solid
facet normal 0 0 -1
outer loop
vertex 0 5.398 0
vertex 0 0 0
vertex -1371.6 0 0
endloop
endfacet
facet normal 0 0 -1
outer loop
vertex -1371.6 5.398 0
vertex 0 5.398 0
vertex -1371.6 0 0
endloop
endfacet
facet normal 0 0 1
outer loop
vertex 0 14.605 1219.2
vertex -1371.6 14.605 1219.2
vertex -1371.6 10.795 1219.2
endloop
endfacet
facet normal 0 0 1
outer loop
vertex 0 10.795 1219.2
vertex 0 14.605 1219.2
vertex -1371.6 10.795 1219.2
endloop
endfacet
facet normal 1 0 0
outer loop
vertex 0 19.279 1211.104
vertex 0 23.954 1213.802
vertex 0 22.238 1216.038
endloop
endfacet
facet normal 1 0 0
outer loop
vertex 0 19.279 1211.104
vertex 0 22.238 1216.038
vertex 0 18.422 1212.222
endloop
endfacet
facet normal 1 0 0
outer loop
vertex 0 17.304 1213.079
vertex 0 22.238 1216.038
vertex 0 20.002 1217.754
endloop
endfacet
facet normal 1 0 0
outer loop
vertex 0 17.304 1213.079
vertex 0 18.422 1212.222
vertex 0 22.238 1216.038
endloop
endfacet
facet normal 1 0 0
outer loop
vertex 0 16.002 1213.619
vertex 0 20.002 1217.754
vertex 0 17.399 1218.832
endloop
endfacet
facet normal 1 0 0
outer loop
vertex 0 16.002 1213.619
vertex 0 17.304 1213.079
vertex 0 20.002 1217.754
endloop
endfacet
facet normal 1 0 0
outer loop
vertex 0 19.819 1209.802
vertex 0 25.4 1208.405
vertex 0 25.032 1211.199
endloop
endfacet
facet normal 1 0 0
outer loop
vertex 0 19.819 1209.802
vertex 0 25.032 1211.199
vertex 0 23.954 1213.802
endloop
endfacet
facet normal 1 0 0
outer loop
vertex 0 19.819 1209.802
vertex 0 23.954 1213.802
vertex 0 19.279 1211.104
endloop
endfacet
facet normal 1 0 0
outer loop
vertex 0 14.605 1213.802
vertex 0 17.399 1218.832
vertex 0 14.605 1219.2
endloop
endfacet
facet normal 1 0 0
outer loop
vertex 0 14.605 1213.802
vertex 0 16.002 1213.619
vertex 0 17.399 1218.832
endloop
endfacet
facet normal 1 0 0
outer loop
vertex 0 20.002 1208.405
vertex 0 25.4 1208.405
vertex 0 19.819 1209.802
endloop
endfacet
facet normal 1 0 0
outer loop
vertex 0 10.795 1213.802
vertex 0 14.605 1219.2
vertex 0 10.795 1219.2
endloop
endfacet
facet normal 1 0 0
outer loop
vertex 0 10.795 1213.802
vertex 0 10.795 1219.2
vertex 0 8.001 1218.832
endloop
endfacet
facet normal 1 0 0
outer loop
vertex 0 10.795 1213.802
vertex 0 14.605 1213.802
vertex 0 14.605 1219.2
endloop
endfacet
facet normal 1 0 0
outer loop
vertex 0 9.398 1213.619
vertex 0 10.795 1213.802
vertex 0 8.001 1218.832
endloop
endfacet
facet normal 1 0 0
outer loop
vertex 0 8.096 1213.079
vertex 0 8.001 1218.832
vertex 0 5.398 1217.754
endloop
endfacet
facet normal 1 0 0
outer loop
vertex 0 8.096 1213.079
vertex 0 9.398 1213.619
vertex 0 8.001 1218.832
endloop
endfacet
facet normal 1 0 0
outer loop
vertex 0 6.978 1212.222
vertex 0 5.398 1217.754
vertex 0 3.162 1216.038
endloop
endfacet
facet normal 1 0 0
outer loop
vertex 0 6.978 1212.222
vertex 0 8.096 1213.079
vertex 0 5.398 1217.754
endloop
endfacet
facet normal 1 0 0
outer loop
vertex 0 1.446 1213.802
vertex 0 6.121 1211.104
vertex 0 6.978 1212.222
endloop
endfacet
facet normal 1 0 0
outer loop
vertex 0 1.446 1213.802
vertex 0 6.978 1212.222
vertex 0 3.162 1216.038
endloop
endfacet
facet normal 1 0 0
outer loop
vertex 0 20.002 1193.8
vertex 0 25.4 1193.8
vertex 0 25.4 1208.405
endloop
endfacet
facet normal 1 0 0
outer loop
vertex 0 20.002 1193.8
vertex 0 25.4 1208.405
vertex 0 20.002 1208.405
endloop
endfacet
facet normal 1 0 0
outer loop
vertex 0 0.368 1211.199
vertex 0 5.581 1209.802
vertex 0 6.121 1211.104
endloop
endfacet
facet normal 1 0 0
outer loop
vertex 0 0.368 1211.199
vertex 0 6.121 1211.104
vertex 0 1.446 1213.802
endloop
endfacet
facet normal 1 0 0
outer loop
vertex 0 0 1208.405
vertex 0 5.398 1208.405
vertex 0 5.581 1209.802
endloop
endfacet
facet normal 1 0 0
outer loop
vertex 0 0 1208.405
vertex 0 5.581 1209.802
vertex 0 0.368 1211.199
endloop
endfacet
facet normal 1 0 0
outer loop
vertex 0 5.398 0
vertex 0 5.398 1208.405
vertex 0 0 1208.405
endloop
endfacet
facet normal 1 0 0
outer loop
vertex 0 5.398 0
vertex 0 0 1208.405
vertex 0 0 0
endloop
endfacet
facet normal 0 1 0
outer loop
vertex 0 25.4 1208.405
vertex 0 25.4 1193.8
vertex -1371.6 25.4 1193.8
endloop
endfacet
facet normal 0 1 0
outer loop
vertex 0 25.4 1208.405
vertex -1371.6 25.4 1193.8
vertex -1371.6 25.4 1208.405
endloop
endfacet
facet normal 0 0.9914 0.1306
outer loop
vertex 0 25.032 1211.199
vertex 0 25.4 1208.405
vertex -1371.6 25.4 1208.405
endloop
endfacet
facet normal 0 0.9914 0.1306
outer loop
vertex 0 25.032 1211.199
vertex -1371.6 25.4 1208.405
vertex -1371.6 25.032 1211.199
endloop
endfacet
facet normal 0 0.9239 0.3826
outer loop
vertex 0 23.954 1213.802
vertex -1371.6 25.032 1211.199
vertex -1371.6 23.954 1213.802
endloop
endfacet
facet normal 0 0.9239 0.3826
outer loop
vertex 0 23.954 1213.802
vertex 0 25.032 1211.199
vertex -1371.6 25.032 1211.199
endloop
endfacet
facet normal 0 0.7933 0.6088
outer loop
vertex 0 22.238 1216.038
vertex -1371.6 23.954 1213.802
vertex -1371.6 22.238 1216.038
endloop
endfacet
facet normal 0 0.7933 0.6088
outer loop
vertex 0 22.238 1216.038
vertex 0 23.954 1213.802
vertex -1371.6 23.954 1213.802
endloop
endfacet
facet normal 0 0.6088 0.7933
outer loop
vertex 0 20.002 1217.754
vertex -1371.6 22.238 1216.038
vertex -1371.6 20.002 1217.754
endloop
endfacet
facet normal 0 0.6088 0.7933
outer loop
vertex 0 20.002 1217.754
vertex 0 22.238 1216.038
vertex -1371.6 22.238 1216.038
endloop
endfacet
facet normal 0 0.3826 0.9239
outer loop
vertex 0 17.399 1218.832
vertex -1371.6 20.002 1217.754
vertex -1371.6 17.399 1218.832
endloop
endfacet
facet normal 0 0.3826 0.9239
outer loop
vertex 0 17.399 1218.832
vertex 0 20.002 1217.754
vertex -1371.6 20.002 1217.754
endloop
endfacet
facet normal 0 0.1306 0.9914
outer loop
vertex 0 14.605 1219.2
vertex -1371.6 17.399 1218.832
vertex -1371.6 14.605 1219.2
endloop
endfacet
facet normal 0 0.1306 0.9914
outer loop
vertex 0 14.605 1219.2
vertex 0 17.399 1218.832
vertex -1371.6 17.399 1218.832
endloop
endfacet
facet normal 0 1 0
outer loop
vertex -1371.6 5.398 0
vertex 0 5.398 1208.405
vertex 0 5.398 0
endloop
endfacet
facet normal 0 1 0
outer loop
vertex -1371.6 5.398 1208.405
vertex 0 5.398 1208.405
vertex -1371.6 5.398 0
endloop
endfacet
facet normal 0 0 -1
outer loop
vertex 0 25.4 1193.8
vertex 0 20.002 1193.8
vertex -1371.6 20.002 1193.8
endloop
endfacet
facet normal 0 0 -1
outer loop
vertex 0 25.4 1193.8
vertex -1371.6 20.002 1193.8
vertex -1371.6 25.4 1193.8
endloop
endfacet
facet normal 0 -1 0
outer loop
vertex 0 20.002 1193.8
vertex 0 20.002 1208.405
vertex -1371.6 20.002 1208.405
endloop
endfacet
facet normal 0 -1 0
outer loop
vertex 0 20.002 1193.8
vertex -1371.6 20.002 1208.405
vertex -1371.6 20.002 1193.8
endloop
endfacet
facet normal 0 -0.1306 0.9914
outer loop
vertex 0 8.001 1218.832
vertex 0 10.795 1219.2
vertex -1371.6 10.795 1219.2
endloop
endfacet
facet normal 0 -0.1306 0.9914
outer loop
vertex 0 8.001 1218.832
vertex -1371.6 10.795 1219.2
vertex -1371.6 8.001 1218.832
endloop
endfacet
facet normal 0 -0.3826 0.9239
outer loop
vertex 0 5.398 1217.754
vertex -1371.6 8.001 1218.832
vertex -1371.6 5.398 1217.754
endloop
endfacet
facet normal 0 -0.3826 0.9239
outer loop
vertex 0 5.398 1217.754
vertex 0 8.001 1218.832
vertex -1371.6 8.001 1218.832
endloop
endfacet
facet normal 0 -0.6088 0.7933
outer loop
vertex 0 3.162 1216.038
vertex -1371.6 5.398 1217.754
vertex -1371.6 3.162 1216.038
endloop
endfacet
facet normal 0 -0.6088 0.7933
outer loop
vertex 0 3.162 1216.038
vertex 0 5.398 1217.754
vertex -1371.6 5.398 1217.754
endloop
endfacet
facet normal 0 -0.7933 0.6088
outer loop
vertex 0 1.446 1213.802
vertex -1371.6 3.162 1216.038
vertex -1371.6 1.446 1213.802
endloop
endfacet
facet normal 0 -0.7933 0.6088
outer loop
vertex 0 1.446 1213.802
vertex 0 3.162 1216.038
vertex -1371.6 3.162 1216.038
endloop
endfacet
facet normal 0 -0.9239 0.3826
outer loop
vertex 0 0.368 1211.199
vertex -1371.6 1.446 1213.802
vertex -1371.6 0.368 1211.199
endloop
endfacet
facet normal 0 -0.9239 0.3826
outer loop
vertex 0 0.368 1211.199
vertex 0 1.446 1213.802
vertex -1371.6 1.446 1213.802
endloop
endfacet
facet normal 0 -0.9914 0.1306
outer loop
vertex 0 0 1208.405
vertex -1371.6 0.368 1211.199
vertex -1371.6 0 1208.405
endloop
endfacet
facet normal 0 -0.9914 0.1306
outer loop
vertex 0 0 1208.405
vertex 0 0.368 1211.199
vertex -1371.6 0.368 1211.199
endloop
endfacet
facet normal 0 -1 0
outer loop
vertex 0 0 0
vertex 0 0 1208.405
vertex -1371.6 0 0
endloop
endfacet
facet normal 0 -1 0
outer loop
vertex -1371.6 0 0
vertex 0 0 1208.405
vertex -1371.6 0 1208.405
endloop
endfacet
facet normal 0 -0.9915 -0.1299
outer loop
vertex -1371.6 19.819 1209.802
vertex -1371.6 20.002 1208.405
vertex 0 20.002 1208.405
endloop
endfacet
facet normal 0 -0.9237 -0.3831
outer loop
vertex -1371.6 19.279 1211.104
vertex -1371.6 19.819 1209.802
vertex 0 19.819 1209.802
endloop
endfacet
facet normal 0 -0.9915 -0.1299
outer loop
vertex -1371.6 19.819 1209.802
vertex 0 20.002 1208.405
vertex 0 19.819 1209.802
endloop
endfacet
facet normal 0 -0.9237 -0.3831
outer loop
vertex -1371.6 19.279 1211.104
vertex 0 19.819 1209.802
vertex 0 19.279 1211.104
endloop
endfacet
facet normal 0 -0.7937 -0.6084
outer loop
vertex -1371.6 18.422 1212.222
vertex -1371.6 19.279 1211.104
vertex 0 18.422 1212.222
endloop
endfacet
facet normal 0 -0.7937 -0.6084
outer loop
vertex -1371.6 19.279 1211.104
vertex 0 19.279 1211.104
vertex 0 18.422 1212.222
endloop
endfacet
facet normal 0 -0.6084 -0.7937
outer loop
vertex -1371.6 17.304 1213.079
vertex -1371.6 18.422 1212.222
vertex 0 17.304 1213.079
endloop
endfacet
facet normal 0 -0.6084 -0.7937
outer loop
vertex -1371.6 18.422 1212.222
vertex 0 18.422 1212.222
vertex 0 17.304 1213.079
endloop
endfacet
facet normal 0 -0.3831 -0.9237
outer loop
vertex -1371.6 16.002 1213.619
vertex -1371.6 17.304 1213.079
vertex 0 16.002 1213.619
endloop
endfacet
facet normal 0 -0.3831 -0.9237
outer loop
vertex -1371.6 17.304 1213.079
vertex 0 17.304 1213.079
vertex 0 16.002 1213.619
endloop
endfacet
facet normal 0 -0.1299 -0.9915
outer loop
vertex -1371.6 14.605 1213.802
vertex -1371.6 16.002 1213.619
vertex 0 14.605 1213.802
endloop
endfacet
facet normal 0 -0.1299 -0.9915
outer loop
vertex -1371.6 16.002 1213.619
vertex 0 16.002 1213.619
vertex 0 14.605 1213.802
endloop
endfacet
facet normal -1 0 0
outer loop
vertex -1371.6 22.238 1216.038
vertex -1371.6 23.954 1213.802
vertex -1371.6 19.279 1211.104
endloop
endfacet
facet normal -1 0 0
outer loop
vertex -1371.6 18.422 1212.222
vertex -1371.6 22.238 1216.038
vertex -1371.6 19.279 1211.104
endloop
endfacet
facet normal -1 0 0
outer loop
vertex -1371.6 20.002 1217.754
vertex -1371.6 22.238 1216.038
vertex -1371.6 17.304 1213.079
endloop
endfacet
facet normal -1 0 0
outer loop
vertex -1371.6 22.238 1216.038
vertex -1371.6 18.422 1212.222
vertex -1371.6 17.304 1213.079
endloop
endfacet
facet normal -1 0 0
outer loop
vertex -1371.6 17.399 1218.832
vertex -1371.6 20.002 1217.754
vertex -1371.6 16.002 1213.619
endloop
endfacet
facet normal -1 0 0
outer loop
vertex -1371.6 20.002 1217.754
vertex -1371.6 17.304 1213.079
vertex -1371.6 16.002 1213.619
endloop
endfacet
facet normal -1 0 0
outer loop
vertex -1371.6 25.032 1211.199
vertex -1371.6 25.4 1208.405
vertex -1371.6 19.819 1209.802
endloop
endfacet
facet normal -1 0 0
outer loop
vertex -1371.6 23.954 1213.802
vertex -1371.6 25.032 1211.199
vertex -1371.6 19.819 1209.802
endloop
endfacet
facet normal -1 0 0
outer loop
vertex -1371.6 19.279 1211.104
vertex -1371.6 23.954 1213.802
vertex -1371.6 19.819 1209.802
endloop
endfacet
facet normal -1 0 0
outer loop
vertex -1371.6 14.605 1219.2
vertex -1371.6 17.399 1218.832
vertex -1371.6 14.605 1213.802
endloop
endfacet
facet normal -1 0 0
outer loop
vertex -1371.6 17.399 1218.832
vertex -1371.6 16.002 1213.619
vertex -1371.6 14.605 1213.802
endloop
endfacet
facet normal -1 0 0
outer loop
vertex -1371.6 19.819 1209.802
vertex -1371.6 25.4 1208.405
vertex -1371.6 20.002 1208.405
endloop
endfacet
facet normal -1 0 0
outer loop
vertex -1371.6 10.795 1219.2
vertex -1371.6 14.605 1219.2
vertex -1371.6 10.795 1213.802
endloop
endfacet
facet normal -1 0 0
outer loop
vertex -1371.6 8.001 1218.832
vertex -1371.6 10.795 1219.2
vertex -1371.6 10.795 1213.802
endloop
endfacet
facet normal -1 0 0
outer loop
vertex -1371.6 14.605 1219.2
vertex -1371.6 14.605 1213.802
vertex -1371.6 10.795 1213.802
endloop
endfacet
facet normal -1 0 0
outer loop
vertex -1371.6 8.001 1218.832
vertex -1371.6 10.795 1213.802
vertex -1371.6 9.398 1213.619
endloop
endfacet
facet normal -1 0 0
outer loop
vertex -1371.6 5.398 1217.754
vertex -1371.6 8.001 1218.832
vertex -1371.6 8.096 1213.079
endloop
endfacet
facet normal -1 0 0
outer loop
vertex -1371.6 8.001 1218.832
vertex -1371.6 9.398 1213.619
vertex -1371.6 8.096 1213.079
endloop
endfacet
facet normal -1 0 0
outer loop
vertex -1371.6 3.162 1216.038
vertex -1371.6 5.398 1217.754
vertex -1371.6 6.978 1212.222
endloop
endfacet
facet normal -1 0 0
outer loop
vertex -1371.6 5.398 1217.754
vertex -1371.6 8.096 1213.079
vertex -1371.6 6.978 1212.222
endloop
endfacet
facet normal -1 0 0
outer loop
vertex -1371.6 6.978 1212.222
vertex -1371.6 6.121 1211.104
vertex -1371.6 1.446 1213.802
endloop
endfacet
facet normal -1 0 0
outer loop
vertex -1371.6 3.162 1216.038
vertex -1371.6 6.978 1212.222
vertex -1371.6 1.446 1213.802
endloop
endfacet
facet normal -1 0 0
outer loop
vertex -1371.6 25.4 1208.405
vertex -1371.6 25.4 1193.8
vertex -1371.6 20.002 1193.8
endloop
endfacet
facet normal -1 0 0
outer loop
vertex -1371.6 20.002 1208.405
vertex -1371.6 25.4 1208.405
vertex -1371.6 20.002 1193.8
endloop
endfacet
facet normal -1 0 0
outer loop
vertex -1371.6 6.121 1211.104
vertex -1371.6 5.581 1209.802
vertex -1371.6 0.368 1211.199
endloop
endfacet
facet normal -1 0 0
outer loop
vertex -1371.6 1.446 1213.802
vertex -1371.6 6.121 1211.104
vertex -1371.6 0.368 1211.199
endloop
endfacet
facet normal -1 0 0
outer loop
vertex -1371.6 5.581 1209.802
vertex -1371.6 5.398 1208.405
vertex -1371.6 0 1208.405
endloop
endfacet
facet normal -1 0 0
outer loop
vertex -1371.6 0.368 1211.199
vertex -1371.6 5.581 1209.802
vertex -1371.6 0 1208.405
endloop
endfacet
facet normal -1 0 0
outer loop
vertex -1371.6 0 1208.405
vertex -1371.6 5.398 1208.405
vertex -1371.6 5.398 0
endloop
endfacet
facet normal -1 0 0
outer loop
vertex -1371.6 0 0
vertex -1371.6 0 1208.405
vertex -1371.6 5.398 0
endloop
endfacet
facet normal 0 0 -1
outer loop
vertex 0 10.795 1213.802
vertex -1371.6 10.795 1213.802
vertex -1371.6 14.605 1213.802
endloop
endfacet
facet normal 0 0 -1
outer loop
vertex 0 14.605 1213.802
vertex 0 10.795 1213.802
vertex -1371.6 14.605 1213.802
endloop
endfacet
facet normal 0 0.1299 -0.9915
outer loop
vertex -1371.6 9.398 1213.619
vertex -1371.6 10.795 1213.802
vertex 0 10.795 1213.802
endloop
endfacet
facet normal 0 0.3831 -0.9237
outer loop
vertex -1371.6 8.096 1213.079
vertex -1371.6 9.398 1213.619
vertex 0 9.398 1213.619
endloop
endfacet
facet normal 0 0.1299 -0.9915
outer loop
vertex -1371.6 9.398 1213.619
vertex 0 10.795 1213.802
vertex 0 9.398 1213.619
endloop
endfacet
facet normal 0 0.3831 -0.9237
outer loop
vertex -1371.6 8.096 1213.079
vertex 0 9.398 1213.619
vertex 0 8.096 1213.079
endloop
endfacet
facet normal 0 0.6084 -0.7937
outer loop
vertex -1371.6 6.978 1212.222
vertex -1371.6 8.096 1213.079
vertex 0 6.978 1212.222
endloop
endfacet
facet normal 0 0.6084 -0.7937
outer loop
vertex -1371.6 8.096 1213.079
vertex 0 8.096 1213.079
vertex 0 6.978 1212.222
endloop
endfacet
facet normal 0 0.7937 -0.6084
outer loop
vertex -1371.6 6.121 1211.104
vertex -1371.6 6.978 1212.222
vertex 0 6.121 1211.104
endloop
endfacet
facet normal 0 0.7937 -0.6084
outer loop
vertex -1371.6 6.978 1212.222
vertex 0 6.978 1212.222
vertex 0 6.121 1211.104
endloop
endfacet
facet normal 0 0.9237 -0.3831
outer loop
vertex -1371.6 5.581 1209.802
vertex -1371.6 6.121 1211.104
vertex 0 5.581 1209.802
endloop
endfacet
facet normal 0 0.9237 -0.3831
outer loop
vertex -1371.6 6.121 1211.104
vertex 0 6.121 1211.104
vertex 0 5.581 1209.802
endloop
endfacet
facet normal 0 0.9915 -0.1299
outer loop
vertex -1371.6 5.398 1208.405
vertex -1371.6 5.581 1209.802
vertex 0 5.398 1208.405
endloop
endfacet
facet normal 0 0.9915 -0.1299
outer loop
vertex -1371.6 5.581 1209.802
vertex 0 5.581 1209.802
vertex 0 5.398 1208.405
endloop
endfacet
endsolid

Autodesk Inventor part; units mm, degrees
ref_plane "YZ Plane" through (0, 0, 0) normal (1, 0, 0) x (0, 1, 0)
ref_plane "XZ Plane" through (0, 0, 0) normal (0, 1, 0) x (-1, 0, 0)
ref_plane "XY Plane" through (0, 0, 0) normal (0, 0, 1) x (1, 0, 0)
sketch "Sketch1" plane through (0, 0, 0) normal (0, 1, 0) x (-1, 0, 0)
  line L0 (0, 0) -> (1371.6, 0)
  line L1 (1371.6, 0) -> (1371.6, 1219.2)
  line L2 (1371.6, 1219.2) -> (0, 1219.2)
  line L3 (0, 1219.2) -> (0, 0)
  dimension "d0" = 1371.6
  dimension "d1" = 1219.2
extrude "Plate1" add sketch "Sketch1" along normal blind 5.3975
sketch "Sketch2" plane through (0, 0, 1213.8025) normal (0, 0, 1) x (1, 0, 0)
  line L0 (-1371.6, 0) -> (0, 0)
  line L1 (0, 0) -> (0, 25.4)
  line L2 (0, 25.4) -> (-1371.6, 25.4)
  line L3 (-1371.6, 25.4) -> (-1371.6, 0)
edge flange "Flange1" height 25.4 angle 90 thickness 5.3975 bend radius 5.3975 thickness toward (0, 0, 1) relief tear relief width 5.3975 relief depth 2.6987 edges at (-685.8, 5.3975, 1219.2) wall of the first edge with corners at (-1371.6, 0, 1213.8025) (0, 0, 1213.8025) (0, 25.4, 1213.8025) (-1371.6, 25.4, 1213.8025)
bend "Bend1"
corner "Corner1"
sketch "Sketch3" plane through (0, 20.0025, 1219.2) normal (0, 1, 0) x (-1, 0, 0)
  line L0 (1371.6, 0) -> (0, 0)
  line L1 (0, 0) -> (0, -25.4)
  line L2 (0, -25.4) -> (1371.6, -25.4)
  line L3 (1371.6, -25.4) -> (1371.6, 0)
edge flange "Flange2" height 25.4 angle 90 thickness 5.3975 bend radius 5.3975 thickness toward (0, 1, 0) relief tear relief width 5.3975 relief depth 2.6987 edges at (-685.8, 25.4, 1213.8025) wall of the first edge with corners at (-1371.6, 20.0025, 1219.2) (0, 20.0025, 1219.2) (0, 20.0025, 1193.8) (-1371.6, 20.0025, 1193.8)
bend "Bend2"
corner "Corner2"
equation "\"d3\" = BendReliefWidth"
equation "\"d4\" = BendReliefDepth"
equation "\"d5\" = MinimumRemnant"
equation "\"d6\" = BendRadius"
equation "\"d9\" = BendRadius"
equation "\"d10\" = CornerReliefSize"
equation "\"d11\" = GapSize"
equation "\"d12\" = JacobiRadiusSize"
equation "\"d13\" = BendReliefWidth"
equation "\"d14\" = BendReliefDepth"
equation "\"d15\" = MinimumRemnant"
equation "\"d16\" = BendRadius"
equation "\"d19\" = BendRadius"
equation "\"d20\" = CornerReliefSize"
equation "\"d21\" = GapSize"
equation "\"d22\" = JacobiRadiusSize"
equation "\"BendRadius\" = Thickness"
equation "\"BendReliefWidth\" = Thickness"
equation "\"BendReliefDepth\" = 0.5 * Thickness"
equation "\"CornerReliefSize\" = 4 * Thickness"
equation "\"MinimumRemnant\" = 2 * Thickness"
equation "\"TransitionRadius\" = BendRadius"
equation "\"JacobiRadiusSize\" = BendRadius"
equation "\"GapSize\" = Thickness"
equation "\"d2\" = BendRadius"
equation "\"Thickness\" = 5.3975"
properties material "Polycarbonate, Clear"
